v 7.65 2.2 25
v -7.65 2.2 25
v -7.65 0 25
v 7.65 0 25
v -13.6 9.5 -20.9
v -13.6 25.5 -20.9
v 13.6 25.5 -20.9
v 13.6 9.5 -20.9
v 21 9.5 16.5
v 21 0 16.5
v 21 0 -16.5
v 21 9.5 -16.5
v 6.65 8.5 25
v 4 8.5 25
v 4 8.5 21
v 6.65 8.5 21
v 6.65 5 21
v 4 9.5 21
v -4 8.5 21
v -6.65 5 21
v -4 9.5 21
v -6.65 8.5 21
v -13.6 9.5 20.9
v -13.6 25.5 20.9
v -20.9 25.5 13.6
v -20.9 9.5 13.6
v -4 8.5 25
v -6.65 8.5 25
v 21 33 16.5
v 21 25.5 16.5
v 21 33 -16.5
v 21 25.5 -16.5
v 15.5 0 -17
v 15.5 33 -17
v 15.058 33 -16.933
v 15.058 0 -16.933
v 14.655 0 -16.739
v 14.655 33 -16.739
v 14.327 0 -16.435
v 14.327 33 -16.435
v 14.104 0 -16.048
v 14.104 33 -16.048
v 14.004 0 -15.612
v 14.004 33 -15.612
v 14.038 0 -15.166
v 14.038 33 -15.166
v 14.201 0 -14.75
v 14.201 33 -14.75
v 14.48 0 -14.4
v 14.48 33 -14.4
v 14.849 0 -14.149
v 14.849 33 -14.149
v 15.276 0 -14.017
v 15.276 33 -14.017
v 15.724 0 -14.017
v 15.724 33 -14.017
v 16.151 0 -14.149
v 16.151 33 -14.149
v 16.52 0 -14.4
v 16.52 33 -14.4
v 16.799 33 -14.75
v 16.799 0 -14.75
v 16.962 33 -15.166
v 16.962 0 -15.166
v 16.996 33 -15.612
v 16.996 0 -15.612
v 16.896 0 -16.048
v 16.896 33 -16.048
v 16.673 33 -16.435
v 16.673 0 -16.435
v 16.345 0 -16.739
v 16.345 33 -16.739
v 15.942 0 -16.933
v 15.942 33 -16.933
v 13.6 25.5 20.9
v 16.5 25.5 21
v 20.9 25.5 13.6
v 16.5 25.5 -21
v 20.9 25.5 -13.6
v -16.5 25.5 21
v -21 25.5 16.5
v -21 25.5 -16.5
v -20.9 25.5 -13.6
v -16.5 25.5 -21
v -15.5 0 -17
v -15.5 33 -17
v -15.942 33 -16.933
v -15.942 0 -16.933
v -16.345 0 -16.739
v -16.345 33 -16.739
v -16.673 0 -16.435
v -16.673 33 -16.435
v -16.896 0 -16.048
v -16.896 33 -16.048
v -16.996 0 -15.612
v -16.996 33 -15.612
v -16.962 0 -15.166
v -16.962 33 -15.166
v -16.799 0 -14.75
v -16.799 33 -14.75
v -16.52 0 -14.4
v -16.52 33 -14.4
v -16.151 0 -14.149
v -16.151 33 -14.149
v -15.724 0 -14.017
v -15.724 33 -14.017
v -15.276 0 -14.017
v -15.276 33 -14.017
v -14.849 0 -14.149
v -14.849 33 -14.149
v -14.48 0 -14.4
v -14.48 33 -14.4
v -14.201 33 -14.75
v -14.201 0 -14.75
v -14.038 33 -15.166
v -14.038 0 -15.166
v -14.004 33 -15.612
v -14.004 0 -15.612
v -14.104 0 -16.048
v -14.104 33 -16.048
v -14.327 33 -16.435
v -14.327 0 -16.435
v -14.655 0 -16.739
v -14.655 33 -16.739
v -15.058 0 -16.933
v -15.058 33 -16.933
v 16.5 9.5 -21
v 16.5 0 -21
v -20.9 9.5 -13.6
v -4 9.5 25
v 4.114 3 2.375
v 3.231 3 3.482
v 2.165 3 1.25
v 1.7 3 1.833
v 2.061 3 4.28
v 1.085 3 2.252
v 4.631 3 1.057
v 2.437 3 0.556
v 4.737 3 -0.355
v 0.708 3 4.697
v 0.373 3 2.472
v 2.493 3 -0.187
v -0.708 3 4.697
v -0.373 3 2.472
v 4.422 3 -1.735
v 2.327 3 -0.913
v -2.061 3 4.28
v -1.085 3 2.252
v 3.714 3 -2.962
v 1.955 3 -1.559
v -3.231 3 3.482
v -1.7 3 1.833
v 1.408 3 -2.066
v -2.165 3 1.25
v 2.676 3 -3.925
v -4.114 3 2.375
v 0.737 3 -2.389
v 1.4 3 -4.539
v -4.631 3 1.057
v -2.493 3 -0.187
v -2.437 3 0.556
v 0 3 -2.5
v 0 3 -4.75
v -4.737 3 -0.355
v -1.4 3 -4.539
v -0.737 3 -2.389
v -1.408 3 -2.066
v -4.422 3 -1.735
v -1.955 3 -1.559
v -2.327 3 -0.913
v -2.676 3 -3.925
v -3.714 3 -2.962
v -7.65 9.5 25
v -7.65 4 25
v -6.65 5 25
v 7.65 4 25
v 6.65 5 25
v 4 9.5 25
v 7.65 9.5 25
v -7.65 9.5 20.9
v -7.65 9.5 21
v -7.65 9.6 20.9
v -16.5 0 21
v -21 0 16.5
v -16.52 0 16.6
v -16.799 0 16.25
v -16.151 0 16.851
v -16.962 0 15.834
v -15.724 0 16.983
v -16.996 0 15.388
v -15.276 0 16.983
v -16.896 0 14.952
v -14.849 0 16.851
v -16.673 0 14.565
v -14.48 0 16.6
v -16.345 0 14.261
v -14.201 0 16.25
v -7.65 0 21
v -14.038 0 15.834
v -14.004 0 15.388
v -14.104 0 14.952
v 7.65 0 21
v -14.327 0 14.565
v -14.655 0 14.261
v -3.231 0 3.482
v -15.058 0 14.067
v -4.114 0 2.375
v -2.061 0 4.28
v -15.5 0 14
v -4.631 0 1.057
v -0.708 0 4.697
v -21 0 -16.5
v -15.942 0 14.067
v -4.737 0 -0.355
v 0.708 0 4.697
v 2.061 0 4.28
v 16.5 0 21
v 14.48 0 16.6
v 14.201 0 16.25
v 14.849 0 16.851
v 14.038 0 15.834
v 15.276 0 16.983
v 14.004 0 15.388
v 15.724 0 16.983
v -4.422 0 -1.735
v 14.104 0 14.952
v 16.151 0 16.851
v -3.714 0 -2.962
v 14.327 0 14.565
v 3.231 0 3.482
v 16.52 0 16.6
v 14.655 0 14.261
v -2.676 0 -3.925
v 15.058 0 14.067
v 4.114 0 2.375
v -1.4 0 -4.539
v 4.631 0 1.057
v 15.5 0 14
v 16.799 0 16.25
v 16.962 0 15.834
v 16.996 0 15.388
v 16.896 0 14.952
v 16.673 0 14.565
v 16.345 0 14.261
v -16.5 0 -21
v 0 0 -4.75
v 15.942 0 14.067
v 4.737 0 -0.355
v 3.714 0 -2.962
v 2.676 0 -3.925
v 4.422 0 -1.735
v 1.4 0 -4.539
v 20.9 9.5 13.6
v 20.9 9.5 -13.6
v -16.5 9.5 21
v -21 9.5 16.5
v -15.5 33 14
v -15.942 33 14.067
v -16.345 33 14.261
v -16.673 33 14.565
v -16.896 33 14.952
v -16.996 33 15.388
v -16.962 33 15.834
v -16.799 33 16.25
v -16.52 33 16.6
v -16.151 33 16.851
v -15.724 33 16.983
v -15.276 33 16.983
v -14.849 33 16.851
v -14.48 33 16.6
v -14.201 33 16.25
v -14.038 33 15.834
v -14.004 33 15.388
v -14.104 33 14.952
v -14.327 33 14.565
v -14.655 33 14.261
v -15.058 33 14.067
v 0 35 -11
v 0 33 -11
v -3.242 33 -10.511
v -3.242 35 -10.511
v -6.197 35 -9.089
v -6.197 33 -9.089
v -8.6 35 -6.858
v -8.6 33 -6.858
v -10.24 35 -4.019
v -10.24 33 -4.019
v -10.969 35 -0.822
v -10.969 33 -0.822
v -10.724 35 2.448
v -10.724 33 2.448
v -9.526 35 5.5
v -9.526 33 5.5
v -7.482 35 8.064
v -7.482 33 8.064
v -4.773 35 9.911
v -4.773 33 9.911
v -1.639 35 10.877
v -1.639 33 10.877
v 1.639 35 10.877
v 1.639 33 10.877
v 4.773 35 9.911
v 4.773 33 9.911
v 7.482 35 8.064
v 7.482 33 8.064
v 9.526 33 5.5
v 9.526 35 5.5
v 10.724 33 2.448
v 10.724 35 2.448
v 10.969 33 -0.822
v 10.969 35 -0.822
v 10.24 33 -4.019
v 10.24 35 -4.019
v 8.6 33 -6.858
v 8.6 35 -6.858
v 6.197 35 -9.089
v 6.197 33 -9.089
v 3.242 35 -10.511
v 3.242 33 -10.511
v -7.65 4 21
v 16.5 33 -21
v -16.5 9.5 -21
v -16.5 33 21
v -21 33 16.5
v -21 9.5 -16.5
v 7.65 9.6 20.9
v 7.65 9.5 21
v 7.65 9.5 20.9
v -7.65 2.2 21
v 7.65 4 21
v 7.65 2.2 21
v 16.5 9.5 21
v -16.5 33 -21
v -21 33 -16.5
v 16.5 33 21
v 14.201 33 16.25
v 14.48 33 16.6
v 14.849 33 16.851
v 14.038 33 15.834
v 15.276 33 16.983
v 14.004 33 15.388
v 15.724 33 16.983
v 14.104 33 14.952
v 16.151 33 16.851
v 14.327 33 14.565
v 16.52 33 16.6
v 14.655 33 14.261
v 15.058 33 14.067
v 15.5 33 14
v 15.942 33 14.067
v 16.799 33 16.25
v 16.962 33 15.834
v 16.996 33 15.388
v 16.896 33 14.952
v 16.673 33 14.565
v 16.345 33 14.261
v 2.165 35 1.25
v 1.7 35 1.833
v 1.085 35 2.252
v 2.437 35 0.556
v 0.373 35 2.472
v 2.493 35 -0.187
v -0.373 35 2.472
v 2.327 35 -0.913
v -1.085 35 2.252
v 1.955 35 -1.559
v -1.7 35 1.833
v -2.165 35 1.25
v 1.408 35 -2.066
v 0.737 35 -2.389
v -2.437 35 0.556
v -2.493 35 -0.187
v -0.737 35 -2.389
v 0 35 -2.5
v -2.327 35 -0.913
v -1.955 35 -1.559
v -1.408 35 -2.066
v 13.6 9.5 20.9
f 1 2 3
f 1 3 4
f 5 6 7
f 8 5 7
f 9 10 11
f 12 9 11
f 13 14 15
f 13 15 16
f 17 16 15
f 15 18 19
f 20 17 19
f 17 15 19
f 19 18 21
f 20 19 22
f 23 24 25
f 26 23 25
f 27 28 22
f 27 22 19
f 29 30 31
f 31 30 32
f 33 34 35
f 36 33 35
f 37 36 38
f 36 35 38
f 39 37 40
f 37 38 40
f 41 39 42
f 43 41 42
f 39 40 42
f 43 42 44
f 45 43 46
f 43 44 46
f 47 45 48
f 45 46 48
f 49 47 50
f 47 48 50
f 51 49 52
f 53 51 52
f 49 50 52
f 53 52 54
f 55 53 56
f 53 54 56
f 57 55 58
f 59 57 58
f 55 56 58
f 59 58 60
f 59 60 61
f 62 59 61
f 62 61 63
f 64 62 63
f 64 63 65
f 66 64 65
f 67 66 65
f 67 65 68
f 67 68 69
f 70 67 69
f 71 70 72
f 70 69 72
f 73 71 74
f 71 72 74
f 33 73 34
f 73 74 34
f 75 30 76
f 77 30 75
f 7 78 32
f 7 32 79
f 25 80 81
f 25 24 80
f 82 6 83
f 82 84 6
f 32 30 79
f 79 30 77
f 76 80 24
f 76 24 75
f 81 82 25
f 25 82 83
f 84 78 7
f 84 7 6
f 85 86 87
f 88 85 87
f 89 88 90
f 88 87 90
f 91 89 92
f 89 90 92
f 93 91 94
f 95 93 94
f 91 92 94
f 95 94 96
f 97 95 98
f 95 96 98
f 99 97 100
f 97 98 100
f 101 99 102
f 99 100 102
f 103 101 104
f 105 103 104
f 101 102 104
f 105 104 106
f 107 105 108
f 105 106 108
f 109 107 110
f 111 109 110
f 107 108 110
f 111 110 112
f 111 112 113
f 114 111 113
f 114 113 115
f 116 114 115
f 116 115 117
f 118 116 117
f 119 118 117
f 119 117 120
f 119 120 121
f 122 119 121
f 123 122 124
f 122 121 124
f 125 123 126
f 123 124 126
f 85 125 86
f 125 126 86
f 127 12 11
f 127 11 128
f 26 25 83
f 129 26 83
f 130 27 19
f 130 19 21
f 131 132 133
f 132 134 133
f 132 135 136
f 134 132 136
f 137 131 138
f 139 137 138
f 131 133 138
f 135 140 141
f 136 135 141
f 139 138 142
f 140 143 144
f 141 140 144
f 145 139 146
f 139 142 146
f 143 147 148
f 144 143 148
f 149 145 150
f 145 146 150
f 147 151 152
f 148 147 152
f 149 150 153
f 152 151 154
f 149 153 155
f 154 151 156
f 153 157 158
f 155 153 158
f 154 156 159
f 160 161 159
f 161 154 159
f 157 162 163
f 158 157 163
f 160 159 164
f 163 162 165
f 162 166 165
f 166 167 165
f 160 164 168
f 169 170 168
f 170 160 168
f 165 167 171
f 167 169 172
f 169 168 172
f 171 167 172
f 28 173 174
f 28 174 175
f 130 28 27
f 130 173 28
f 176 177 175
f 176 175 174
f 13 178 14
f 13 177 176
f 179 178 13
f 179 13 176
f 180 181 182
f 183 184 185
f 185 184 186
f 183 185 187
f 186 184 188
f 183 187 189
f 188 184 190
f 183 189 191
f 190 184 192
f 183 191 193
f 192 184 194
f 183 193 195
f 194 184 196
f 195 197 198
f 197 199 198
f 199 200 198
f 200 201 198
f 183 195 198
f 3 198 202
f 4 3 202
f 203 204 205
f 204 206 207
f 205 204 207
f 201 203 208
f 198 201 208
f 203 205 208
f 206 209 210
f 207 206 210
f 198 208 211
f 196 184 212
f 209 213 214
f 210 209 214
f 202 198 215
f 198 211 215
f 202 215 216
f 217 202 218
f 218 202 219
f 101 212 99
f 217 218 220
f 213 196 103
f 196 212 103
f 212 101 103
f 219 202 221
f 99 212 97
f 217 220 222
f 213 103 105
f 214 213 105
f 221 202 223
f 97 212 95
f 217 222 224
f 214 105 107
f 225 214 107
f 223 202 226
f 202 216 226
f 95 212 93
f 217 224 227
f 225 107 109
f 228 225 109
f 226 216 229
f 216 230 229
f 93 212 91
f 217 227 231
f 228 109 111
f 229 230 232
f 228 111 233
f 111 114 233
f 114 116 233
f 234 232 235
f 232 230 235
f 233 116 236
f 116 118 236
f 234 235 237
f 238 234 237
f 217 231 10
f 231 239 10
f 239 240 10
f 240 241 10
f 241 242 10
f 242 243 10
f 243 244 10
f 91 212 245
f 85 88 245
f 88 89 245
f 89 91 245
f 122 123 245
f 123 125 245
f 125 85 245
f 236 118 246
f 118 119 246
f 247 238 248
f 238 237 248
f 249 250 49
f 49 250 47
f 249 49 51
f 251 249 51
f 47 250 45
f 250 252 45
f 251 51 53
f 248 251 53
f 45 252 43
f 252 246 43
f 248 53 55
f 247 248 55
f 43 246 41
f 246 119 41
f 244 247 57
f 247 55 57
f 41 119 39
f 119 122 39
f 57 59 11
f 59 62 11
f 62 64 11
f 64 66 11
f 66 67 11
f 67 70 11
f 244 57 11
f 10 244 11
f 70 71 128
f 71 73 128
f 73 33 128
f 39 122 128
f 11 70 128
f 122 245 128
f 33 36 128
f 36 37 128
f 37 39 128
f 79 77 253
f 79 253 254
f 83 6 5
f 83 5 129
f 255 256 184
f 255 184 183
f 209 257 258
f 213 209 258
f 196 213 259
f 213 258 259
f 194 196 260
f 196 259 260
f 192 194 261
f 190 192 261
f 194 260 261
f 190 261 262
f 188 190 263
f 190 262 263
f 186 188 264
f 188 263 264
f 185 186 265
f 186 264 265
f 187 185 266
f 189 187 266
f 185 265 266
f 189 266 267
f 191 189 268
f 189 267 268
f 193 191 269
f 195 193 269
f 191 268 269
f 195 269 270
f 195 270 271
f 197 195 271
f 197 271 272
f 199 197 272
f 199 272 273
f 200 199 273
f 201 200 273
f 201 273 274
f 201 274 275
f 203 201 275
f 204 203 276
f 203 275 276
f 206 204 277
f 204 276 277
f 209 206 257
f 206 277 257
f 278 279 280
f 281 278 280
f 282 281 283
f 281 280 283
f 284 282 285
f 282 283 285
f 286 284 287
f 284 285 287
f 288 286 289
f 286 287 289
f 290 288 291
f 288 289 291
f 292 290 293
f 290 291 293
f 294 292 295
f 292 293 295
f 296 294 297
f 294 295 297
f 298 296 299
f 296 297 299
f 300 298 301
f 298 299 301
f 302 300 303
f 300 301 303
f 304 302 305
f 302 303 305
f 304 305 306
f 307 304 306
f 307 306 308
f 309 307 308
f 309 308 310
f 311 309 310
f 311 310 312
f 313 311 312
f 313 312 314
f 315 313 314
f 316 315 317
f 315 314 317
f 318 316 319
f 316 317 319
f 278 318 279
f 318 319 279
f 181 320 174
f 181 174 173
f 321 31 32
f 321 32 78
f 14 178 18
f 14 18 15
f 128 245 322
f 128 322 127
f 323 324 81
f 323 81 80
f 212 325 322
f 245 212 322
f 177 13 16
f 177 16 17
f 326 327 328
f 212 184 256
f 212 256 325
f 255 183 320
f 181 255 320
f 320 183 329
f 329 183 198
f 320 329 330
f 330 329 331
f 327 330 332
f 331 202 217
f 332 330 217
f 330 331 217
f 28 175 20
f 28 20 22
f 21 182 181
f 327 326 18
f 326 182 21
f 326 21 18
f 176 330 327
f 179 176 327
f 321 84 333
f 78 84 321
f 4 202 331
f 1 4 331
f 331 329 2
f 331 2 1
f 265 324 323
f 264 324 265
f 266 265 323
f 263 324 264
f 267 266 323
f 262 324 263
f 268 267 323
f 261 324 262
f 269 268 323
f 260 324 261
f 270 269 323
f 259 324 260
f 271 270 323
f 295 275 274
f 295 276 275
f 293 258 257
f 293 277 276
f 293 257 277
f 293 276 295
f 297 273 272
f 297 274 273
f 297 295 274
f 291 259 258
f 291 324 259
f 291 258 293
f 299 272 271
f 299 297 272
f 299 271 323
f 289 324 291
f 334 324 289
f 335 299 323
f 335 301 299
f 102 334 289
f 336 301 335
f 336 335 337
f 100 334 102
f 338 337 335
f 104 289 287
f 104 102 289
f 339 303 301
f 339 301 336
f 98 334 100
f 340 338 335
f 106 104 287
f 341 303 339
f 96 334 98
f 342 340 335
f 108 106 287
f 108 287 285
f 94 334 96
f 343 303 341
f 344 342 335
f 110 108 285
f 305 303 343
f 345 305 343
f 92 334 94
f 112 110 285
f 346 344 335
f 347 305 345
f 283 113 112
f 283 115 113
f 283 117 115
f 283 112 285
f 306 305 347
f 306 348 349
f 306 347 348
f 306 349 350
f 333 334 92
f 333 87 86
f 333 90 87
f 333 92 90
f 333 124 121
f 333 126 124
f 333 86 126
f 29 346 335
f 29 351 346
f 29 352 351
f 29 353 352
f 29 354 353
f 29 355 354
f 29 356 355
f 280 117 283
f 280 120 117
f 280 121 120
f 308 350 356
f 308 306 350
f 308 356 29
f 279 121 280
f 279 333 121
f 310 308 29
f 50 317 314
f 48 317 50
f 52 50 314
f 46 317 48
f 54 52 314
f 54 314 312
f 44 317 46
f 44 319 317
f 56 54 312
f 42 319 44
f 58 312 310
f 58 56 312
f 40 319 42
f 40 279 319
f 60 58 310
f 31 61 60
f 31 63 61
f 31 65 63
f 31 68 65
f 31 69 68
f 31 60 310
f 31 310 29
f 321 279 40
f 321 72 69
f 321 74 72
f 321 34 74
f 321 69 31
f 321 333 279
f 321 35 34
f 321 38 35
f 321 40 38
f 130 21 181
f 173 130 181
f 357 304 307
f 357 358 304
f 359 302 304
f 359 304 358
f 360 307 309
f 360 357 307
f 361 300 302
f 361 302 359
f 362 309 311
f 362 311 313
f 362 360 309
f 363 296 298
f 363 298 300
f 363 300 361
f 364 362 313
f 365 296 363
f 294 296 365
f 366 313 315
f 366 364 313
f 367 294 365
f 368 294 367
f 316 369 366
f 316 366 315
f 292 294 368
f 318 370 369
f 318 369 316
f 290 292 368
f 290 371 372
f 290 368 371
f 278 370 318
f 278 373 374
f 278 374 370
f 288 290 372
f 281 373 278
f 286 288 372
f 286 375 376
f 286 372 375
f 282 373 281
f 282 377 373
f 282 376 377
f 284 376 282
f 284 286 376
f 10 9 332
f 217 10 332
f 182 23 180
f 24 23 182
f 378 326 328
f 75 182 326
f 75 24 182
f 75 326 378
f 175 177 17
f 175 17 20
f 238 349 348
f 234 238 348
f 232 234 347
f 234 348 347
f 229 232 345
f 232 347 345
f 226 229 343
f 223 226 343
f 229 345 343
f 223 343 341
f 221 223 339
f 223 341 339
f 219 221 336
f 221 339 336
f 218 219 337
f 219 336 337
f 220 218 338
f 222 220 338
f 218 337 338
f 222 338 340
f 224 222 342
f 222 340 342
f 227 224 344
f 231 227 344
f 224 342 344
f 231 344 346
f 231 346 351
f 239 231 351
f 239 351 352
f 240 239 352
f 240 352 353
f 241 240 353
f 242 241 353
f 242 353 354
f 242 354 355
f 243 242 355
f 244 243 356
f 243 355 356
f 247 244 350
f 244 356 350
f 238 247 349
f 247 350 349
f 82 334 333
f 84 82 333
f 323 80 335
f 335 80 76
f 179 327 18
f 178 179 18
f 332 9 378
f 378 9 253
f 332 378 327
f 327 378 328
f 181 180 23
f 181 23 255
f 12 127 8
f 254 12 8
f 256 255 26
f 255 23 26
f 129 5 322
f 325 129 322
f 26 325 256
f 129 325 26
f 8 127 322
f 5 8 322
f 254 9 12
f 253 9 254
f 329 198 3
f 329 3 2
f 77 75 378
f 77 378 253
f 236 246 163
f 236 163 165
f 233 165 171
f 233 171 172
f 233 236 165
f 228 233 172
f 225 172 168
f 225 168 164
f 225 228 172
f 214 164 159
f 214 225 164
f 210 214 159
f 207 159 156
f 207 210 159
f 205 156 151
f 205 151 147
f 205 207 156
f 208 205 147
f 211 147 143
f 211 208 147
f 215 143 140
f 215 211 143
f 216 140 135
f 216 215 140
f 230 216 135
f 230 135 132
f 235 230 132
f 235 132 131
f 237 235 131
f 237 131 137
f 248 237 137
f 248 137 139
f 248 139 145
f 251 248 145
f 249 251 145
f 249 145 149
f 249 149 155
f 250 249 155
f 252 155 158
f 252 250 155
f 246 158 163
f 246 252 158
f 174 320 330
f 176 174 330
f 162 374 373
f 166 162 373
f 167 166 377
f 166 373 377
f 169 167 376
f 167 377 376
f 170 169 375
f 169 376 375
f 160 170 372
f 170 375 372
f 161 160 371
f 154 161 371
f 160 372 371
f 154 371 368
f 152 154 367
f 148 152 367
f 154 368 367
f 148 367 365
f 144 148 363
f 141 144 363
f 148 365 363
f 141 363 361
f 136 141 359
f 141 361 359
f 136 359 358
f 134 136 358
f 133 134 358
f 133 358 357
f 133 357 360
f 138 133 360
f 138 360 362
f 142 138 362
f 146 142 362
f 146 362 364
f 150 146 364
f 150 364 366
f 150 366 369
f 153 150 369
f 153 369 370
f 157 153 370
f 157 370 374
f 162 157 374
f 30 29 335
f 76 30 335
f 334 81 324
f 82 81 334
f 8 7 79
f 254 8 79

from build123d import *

# Parameters (mm, degrees)
SKETCH_1_W           = 42
SKETCH_1_H           = 42
EXTRUDE_1_DEPTH      = 33
CUT_EXTRUDE_START    = 33
CUT_EXTRUDE_1_DEPTH  = 33
CUT_EXTRUDE_START_2  = 9.5
CUT_EXTRUDE_2_DEPTH  = 16
CUT_EXTRUDE_START_3  = 21
SKETCH_4_W           = 33
SKETCH_4_H           = 16
CUT_EXTRUDE_3_DEPTH  = 0.1
CUT_EXTRUDE_START_4  = -21
SKETCH_5_W           = 33
SKETCH_5_H           = 16
CUT_EXTRUDE_4_DEPTH  = 0.1
SKETCH_6_W           = 33
SKETCH_6_H           = 16
CUT_EXTRUDE_5_DEPTH  = 0.1
SKETCH_7_W           = 33
SKETCH_7_H           = 16
CUT_EXTRUDE_6_DEPTH  = 0.1
SKETCH_8_R           = 4.75
CUT_EXTRUDE_7_DEPTH  = 3
EXTRUDE_START        = 33
SKETCH_9_R           = 11
EXTRUDE_2_DEPTH      = 2
CUT_EXTRUDE_START_5  = 35
SKETCH_11_R          = 2.5
CUT_EXTRUDE_8_DEPTH  = 35
SKETCH_12_R          = 1.5
CUT_EXTRUDE_9_DEPTH  = 33
EXTRUDE_START_2      = 21
SKETCH_13_W          = 15.3
SKETCH_13_H          = 2.2
EXTRUDE_3_DEPTH      = 4
SKETCH_17_W          = 15.3
SKETCH_17_H          = 5.5
EXTRUDE_7_DEPTH      = 4
CUT_EXTRUDE_START_6  = 25
CUT_EXTRUDE_11_DEPTH = 4
EXTRUDE_START_3      = 7.65
EXTRUDE_8_DEPTH      = 15.3


with BuildPart() as part:
    # 草图1 → 凸台-拉伸1 (new body)
    with BuildSketch(Plane(origin=(0, 0, 0), x_dir=(1, 0, 0), z_dir=(0, 1, 0))):
        Rectangle(SKETCH_1_W, SKETCH_1_H)
    extrude(amount=EXTRUDE_1_DEPTH)

    # 草图2 → 切除-拉伸1 (cut)
    with BuildSketch(Plane(origin=(0, 0, 0), x_dir=(1, 0, 0), z_dir=(0, 1, 0)).offset(CUT_EXTRUDE_START)):
        Polygon((-21, 21), (-21, 16.5), (-16.5, 21), align=None)
        Polygon((-21, -21), (-21, -16.5), (-16.5, -21), align=None)
        Polygon((21, -21), (21, -16.5), (16.5, -21), align=None)
        Polygon((21, 21), (21, 16.5), (16.5, 21), align=None)
    extrude(amount=-CUT_EXTRUDE_1_DEPTH, mode=Mode.SUBTRACT)

    # 草图3 → 切除-拉伸2 (cut)
    with BuildSketch(Plane(origin=(0, 0, 0), x_dir=(1, 0, 0), z_dir=(0, 1, 0)).offset(CUT_EXTRUDE_START_2)):
        Polygon((-21, 13.5), (-21, 21), (-13.5, 21), align=None)
        Polygon((-21, -13.5), (-21, -21), (-13.5, -21), align=None)
        Polygon((21, -13.5), (21, -21), (13.5, -21), align=None)
        Polygon((21, 13.5), (21, 21), (13.5, 21), align=None)
    extrude(amount=CUT_EXTRUDE_2_DEPTH, mode=Mode.SUBTRACT)

    # 草图4 → 切除-拉伸3 (cut)
    with BuildSketch(Plane.XY.offset(CUT_EXTRUDE_START_3)):
        with Locations((0, 17.5)):
            Rectangle(SKETCH_4_W, SKETCH_4_H)
    extrude(amount=-CUT_EXTRUDE_3_DEPTH, mode=Mode.SUBTRACT)

    # 草图5 → 切除-拉伸4 (cut)
    with BuildSketch(Plane.XY.offset(CUT_EXTRUDE_START_4)):
        with Locations((0, 17.5)):
            Rectangle(SKETCH_5_W, SKETCH_5_H)
    extrude(amount=CUT_EXTRUDE_4_DEPTH, mode=Mode.SUBTRACT)

    # 草图6 → 切除-拉伸5 (cut)
    with BuildSketch(Plane(origin=(0, 0, 0), x_dir=(0, 0, -1), z_dir=(1, 0, 0)).offset(CUT_EXTRUDE_START_4)):
        with Locations((0, 17.5)):
            Rectangle(SKETCH_6_W, SKETCH_6_H)
    extrude(amount=CUT_EXTRUDE_5_DEPTH, mode=Mode.SUBTRACT)

    # 草图7 → 切除-拉伸6 (cut)
    with BuildSketch(Plane(origin=(0, 0, 0), x_dir=(0, 0, -1), z_dir=(1, 0, 0)).offset(CUT_EXTRUDE_START_3)):
        with Locations((0, 17.5)):
            Rectangle(SKETCH_7_W, SKETCH_7_H)
    extrude(amount=-CUT_EXTRUDE_6_DEPTH, mode=Mode.SUBTRACT)

    # 草图8 → 切除-拉伸7 (cut)
    with BuildSketch(Plane(origin=(0, 0, 0), x_dir=(1, 0, 0), z_dir=(0, 1, 0))):
        with Locations(Location((0, 0, 0), (0, 0, 90))):
            Circle(SKETCH_8_R)
    extrude(amount=CUT_EXTRUDE_7_DEPTH, mode=Mode.SUBTRACT)

    # 草图9 → 凸台-拉伸2 (add)
    with BuildSketch(Plane(origin=(0, 0, 0), x_dir=(1, 0, 0), z_dir=(0, 1, 0)).offset(EXTRUDE_START)):
        with Locations(Location((0, 0, 0), (0, 0, 90))):
            Circle(SKETCH_9_R)
    extrude(amount=EXTRUDE_2_DEPTH)

    # 草图11 → 切除-拉伸8 (cut)
    with BuildSketch(Plane(origin=(0, 0, 0), x_dir=(1, 0, 0), z_dir=(0, 1, 0)).offset(CUT_EXTRUDE_START_5)):
        with Locations(Location((0, 0, 0), (0, 0, 90))):
            Circle(SKETCH_11_R)
    extrude(amount=-CUT_EXTRUDE_8_DEPTH, mode=Mode.SUBTRACT)

    # 草图12 → 切除-拉伸9 (cut)
    with BuildSketch(Plane(origin=(0, 0, 0), x_dir=(1, 0, 0), z_dir=(0, 1, 0)).offset(CUT_EXTRUDE_START)):
        with Locations(Location((-15.5, 15.5, 0), (0, 0, 90))):
            Circle(SKETCH_12_R)
        with Locations(Location((-15.5, -15.5, 0), (0, 0, 90))):
            Circle(SKETCH_12_R)
        with Locations(Location((15.5, -15.5, 0), (0, 0, 90))):
            Circle(SKETCH_12_R)
        with Locations(Location((15.5, 15.5, 0), (0, 0, 90))):
            Circle(SKETCH_12_R)
    extrude(amount=-CUT_EXTRUDE_9_DEPTH, mode=Mode.SUBTRACT)

    # 草图13 → 凸台-拉伸3 (add)
    with BuildSketch(Plane.XY.offset(EXTRUDE_START_2)):
        with Locations((0, 1.1)):
            Rectangle(SKETCH_13_W, SKETCH_13_H)
    extrude(amount=EXTRUDE_3_DEPTH)

    # 草图17 → 凸台-拉伸7 (add)
    with BuildSketch(Plane.XY.offset(EXTRUDE_START_2)):
        with Locations((0, 6.75)):
            Rectangle(SKETCH_17_W, SKETCH_17_H)
    extrude(amount=EXTRUDE_7_DEPTH)

    # 草图18 → 切除-拉伸11 (cut)
    with BuildSketch(Plane.XY.offset(CUT_EXTRUDE_START_6)):
        Polygon((-6.65, 8.5), (-4, 8.5), (-4, 9.5), (4, 9.5), (4, 8.5), (6.65, 8.5), (6.65, 5), (-6.65, 5), align=None)
    extrude(amount=-CUT_EXTRUDE_11_DEPTH, mode=Mode.SUBTRACT)

    # 草图19 → 凸台-拉伸8 (add)
    with BuildSketch(Plane(origin=(0, 0, 0), x_dir=(0, 0, -1), z_dir=(1, 0, 0)).offset(EXTRUDE_START_3)):
        Polygon((-21, 9.5), (-20.9, 9.5), (-20.9, 9.6), align=None)
    extrude(amount=-EXTRUDE_8_DEPTH)


solid = part.part
